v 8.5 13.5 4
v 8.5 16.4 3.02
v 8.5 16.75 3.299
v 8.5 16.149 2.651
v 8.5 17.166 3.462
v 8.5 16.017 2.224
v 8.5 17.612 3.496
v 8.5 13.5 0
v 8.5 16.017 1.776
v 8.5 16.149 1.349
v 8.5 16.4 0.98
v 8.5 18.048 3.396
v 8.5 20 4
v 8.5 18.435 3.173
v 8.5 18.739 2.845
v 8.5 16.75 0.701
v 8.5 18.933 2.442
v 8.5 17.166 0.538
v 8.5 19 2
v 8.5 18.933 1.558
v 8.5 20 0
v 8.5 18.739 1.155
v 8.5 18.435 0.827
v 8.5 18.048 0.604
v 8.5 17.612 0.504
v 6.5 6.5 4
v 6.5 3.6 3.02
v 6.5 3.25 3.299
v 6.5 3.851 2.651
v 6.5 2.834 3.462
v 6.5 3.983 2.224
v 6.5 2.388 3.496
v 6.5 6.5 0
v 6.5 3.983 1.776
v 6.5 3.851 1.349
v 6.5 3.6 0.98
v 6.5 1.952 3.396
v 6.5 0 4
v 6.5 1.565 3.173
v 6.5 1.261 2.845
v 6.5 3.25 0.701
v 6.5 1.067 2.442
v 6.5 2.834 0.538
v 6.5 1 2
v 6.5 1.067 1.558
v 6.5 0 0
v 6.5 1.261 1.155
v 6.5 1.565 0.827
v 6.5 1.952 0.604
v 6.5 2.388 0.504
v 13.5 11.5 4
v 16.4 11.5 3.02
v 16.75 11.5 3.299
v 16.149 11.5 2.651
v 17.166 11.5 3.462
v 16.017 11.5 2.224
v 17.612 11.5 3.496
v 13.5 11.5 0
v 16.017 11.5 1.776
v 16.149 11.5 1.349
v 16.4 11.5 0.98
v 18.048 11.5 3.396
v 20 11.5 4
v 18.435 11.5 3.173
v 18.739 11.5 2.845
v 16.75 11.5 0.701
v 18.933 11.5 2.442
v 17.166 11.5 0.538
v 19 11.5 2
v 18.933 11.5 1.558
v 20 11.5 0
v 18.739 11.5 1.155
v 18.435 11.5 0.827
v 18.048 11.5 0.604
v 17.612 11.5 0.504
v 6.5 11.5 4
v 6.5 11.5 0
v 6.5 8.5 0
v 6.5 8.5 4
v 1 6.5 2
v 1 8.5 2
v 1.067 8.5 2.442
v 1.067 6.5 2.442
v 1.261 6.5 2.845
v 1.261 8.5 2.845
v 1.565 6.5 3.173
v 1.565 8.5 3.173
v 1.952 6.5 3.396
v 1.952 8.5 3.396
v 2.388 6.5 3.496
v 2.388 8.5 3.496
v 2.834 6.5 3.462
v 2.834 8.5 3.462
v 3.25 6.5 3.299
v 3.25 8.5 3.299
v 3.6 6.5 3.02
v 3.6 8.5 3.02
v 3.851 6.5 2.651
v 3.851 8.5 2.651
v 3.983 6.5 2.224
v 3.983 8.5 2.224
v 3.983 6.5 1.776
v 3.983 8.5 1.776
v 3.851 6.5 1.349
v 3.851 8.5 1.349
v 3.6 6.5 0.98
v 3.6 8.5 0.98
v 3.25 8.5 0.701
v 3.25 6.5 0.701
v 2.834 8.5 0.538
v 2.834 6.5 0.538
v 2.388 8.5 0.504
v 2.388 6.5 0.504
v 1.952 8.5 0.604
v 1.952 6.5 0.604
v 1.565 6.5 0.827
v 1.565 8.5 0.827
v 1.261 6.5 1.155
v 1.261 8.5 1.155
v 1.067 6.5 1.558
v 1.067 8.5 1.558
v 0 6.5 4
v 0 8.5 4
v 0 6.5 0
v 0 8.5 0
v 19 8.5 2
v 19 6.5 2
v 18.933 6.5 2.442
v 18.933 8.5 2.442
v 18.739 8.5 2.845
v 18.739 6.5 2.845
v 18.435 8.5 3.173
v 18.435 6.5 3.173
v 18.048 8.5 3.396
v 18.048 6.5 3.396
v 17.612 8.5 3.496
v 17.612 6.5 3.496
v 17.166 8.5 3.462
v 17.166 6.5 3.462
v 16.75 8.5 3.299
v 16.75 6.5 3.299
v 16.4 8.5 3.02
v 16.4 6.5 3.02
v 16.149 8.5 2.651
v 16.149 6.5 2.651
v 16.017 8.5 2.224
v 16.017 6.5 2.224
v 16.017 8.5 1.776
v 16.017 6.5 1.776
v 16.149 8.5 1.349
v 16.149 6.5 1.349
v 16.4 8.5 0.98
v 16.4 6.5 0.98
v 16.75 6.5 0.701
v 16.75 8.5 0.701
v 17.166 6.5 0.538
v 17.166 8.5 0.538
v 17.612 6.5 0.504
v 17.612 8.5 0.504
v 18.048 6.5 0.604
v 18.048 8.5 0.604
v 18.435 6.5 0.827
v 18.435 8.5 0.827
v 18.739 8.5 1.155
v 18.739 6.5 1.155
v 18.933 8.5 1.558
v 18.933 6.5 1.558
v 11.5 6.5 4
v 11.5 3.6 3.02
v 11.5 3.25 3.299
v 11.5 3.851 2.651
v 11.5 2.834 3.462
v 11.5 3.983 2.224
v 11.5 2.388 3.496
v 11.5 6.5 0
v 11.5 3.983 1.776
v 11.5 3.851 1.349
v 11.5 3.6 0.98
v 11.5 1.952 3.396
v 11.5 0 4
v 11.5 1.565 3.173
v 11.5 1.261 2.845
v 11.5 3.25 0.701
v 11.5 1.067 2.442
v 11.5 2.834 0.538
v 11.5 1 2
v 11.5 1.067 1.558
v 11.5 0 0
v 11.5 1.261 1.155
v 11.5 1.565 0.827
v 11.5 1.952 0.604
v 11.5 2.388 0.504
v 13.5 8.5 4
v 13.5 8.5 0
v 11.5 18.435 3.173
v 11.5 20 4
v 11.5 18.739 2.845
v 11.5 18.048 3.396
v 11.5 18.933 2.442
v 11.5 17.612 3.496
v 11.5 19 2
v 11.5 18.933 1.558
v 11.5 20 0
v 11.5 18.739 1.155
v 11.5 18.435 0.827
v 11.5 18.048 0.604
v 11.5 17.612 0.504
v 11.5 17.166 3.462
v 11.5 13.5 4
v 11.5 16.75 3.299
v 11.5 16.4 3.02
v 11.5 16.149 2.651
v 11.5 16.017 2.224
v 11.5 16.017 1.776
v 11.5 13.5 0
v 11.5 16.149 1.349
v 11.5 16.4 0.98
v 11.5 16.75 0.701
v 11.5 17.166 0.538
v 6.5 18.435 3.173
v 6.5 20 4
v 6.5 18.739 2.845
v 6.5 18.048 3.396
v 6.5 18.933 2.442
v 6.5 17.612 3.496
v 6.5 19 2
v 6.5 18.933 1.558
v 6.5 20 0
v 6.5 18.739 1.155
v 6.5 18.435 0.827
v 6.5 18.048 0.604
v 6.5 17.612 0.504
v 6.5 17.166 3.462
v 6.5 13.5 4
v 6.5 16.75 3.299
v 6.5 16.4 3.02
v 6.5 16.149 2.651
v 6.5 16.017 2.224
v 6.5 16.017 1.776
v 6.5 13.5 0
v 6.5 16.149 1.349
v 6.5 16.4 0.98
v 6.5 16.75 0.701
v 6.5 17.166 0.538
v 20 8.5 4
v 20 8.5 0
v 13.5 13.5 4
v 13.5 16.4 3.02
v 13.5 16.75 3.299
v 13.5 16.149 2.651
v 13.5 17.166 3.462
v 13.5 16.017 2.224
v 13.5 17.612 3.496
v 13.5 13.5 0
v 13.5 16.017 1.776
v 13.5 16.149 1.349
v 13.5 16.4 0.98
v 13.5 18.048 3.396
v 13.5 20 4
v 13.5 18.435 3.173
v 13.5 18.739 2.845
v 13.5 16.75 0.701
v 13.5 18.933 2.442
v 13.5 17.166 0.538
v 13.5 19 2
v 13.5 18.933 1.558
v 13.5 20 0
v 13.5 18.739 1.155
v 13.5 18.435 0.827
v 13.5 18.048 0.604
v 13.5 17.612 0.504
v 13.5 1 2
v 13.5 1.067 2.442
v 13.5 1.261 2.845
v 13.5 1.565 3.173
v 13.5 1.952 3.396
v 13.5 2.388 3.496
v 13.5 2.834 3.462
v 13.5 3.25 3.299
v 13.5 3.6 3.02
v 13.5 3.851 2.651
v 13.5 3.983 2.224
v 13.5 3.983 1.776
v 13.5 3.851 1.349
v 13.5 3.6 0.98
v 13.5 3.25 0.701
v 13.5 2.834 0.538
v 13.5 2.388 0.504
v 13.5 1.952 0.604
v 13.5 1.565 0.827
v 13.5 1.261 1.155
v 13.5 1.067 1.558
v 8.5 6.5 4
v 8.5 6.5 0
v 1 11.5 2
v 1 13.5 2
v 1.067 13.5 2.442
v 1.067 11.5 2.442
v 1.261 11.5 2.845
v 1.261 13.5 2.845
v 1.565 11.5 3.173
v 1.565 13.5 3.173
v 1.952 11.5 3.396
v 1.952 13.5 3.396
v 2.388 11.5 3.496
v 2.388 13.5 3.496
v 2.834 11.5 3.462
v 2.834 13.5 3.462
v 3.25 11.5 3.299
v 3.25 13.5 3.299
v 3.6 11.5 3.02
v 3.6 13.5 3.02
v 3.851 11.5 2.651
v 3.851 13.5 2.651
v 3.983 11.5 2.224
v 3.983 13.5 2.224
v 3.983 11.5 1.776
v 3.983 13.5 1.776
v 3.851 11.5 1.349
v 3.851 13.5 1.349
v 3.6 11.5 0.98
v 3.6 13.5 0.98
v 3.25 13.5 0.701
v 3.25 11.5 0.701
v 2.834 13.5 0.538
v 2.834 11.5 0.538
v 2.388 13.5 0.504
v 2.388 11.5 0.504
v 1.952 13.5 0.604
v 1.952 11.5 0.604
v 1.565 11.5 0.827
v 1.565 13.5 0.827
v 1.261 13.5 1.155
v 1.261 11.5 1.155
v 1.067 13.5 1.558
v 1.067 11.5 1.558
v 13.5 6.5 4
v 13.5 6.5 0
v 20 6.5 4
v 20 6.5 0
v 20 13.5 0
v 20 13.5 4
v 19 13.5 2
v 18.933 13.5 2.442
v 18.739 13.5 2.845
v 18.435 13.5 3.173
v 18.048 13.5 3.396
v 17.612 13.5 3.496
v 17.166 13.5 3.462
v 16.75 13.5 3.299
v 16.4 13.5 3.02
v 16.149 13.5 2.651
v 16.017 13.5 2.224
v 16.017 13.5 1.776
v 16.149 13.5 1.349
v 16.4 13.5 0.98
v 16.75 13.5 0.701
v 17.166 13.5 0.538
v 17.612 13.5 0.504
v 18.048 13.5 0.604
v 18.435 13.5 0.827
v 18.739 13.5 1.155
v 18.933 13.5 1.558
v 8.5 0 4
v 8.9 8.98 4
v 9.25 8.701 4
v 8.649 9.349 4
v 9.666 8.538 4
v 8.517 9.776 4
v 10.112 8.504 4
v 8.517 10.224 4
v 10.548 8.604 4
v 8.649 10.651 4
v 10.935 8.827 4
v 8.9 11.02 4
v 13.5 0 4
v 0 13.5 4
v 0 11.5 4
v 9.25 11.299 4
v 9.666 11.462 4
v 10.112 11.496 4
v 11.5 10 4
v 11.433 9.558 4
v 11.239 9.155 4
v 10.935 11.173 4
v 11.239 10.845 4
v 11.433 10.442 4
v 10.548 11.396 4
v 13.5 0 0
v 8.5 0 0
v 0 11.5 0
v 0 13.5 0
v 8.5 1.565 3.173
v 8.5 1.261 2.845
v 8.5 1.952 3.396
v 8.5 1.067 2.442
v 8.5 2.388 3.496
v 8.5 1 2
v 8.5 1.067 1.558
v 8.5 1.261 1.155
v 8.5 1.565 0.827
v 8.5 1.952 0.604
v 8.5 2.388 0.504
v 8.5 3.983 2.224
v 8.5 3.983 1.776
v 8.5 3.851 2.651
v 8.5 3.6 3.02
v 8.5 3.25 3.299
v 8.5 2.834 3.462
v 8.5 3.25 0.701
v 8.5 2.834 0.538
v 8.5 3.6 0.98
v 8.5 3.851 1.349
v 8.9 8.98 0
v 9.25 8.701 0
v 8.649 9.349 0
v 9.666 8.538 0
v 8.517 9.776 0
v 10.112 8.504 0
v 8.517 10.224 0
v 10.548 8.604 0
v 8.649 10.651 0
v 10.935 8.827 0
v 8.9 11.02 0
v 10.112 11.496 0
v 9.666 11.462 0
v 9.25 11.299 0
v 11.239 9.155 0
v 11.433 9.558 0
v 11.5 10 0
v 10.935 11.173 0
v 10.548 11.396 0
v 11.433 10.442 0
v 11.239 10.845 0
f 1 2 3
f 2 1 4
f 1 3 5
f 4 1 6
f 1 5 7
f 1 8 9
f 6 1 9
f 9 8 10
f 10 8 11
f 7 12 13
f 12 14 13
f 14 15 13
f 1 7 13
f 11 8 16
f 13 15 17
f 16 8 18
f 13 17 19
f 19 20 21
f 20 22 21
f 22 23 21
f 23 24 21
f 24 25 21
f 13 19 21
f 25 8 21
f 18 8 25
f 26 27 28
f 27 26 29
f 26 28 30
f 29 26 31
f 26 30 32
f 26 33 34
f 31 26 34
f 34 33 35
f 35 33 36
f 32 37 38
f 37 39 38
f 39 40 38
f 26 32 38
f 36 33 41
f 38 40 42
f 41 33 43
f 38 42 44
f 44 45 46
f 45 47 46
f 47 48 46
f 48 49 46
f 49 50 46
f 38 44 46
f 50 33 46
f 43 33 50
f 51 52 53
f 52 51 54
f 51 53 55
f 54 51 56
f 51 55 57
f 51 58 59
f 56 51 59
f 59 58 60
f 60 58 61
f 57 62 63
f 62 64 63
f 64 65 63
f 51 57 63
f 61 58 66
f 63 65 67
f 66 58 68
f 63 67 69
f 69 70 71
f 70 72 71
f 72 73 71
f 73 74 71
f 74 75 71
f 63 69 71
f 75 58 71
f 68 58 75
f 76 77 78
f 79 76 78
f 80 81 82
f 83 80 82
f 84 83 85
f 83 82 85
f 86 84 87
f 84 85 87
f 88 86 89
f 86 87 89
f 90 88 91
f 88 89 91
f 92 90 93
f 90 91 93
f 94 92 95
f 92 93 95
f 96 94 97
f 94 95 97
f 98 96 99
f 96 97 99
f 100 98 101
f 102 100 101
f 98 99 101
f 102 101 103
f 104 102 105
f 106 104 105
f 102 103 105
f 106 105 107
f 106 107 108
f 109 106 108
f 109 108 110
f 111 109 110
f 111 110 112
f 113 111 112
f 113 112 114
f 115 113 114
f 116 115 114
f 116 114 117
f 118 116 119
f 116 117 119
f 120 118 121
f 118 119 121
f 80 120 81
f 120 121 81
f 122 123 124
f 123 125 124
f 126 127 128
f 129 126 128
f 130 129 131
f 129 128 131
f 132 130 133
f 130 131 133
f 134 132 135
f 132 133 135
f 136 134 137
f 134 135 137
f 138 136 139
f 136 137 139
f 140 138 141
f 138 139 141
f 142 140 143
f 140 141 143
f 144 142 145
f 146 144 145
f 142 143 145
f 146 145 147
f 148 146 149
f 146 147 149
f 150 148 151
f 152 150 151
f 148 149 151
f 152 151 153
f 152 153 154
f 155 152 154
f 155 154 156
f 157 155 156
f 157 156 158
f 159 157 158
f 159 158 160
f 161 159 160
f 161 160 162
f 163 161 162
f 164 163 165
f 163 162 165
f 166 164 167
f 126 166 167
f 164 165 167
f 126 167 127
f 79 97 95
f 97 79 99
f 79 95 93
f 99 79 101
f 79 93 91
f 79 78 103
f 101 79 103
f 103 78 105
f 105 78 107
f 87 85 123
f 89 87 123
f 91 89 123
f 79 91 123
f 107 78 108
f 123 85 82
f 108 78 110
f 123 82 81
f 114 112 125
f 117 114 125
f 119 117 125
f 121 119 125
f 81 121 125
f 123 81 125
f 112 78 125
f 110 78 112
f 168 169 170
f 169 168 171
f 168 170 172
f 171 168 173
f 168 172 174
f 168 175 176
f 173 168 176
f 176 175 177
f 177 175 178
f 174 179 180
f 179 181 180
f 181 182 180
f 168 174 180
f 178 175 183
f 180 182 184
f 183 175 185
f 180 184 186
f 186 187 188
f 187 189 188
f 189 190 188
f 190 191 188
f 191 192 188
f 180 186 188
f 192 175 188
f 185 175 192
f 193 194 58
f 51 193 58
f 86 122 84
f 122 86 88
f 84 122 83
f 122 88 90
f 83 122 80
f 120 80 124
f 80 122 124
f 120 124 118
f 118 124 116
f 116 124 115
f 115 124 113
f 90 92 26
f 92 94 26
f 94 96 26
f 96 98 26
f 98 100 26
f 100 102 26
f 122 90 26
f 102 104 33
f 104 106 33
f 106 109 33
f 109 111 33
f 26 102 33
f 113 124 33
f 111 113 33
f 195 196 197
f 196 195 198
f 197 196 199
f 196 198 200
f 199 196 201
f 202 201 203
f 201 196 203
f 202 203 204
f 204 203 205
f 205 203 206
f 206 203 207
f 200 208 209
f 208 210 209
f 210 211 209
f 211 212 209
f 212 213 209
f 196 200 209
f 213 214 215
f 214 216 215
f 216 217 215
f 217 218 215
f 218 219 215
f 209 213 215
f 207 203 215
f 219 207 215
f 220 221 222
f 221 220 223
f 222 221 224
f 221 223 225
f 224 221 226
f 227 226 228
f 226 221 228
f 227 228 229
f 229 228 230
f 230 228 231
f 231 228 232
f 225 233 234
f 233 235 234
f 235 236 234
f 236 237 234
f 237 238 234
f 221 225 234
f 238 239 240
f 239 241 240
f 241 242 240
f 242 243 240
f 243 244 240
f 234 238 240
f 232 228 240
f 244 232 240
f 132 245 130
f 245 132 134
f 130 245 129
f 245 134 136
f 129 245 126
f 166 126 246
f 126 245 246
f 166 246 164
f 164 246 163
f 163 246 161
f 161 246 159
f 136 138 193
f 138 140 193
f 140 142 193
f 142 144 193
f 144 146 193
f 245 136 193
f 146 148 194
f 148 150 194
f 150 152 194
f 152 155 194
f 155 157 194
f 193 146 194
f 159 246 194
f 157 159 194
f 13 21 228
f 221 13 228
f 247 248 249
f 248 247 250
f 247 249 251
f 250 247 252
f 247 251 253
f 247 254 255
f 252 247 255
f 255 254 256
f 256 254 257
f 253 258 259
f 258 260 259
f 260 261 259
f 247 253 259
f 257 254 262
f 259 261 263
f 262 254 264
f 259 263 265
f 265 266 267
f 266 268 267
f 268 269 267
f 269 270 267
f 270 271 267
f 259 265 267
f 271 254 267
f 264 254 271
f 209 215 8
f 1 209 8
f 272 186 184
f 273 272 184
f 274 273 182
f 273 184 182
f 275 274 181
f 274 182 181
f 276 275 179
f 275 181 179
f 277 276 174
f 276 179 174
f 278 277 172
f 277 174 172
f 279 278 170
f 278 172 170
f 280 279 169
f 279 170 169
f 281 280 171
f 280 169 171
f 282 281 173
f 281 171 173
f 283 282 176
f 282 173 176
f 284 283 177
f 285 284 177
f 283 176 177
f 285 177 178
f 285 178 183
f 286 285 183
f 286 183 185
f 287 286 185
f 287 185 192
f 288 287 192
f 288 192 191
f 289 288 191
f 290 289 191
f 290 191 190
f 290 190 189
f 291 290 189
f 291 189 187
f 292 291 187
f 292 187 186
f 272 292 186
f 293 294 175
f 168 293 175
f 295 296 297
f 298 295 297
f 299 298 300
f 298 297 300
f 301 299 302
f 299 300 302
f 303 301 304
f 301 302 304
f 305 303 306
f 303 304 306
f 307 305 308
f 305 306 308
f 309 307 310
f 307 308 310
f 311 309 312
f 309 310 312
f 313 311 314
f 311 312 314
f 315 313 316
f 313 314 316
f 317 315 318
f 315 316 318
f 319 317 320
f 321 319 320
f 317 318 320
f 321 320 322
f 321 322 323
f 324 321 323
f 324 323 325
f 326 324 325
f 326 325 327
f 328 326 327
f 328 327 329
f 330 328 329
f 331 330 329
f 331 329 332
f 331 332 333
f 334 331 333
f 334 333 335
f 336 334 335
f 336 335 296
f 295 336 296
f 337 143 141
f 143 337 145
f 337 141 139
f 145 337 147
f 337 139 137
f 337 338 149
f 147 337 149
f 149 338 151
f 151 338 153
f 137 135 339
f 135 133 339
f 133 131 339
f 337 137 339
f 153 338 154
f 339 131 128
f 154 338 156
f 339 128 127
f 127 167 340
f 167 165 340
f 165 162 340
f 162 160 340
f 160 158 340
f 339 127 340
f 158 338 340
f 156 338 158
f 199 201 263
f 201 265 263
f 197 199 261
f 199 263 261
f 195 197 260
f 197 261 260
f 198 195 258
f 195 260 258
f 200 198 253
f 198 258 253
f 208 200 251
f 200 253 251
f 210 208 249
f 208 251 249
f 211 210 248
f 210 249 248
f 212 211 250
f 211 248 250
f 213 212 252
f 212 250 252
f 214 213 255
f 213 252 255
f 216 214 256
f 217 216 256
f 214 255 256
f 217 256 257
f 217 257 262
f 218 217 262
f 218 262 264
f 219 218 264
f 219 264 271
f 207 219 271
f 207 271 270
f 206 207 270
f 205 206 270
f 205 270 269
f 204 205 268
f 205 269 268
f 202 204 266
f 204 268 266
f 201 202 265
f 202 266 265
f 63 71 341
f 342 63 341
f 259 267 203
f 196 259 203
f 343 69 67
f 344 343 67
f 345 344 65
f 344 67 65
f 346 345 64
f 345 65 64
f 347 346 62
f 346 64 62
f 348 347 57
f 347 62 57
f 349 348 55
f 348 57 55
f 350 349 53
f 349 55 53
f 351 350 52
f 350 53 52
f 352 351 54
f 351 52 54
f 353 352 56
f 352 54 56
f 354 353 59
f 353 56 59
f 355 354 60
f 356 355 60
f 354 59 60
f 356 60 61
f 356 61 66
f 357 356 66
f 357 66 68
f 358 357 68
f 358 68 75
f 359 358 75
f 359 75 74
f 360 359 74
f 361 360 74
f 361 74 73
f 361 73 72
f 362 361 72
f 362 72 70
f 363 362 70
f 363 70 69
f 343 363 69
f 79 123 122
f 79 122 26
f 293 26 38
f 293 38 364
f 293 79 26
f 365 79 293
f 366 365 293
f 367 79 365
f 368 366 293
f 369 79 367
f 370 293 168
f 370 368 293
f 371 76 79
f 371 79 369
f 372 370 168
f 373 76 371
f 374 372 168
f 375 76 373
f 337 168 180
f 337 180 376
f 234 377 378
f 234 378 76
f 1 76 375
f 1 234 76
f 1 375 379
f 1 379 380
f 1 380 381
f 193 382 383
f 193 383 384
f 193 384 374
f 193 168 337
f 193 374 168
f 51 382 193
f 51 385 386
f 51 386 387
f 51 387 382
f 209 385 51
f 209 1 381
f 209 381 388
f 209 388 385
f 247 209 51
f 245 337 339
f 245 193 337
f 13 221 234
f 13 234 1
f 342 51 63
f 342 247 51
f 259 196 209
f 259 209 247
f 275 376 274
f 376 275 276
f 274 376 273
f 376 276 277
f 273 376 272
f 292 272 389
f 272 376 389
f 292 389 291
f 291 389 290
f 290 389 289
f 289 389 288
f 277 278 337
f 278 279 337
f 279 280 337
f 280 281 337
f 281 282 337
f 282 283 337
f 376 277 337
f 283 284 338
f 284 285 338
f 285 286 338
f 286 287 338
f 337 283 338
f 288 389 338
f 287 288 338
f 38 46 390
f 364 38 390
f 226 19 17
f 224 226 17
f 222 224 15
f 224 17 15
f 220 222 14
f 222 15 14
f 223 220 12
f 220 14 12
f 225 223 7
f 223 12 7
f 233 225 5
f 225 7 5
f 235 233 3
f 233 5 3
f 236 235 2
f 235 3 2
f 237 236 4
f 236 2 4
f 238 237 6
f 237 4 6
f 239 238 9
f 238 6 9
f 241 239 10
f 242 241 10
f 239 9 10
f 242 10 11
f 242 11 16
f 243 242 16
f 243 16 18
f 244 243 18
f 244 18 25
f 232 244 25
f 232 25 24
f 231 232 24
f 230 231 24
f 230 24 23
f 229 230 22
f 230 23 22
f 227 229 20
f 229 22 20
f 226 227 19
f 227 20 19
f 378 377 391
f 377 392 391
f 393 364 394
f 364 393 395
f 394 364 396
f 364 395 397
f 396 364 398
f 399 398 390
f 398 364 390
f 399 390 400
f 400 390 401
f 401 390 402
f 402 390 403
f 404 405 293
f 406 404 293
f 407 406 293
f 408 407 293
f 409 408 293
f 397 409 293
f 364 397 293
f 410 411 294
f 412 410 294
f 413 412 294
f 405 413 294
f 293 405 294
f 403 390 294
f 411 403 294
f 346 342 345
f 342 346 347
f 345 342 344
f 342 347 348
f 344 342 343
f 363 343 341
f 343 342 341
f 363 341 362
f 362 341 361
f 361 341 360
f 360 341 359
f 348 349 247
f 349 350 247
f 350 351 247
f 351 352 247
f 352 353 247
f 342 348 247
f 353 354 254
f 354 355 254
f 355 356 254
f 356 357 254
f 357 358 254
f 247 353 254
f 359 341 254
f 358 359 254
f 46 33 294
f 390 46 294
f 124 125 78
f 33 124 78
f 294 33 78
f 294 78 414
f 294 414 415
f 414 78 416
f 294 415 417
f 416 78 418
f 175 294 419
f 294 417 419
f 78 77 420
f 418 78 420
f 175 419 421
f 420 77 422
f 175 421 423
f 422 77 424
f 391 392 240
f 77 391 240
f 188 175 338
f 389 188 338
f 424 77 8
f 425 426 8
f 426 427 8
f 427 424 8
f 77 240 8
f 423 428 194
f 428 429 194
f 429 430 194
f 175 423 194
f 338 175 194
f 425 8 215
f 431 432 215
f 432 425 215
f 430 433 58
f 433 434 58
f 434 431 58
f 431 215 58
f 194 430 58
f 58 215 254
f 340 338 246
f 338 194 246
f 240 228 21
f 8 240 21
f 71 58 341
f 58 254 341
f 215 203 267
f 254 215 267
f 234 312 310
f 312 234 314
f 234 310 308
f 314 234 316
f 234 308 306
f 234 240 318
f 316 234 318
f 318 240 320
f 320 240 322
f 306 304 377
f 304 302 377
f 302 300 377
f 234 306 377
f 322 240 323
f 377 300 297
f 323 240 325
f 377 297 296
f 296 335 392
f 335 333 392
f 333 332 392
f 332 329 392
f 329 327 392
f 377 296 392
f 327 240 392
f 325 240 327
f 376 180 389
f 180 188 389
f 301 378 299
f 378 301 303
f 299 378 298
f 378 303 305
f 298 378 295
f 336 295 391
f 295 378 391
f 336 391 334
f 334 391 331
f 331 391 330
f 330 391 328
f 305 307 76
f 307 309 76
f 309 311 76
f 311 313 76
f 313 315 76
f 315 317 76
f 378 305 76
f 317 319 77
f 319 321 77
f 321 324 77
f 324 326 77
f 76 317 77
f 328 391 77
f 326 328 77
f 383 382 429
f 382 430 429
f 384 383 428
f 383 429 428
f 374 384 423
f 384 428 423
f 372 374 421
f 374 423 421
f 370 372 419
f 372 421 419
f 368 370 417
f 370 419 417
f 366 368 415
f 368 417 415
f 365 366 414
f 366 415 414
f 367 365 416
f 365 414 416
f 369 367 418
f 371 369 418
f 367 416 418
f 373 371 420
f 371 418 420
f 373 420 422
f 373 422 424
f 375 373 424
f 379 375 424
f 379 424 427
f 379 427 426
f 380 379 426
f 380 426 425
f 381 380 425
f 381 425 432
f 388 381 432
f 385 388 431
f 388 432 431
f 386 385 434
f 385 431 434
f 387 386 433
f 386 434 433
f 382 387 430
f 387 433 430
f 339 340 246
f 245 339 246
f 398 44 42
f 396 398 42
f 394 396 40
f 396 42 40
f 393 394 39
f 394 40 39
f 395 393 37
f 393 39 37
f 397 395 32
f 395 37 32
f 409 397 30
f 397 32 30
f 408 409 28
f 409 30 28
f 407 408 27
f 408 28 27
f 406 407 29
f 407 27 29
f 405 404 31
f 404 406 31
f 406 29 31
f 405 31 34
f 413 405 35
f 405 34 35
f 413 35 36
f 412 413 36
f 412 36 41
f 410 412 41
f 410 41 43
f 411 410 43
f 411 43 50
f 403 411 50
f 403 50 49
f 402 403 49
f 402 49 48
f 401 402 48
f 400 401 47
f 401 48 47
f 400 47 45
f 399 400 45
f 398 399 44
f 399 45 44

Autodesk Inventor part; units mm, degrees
ref_plane "YZ Plane" through (0, 0, 0) normal (1, 0, 0) x (0, 1, 0)
ref_plane "XZ Plane" through (0, 0, 0) normal (0, 1, 0) x (-1, 0, 0)
ref_plane "XY Plane" through (0, 0, 0) normal (0, 0, 1) x (1, 0, 0)
sketch "Sketch1" plane through (0, 0, 0) normal (0, 0, 1) x (1, 0, 0)
  line L0 (0, 0) -> (20, 0)
  line L1 (20, 0) -> (20, 20)
  line L2 (20, 20) -> (0, 20)
  line L3 (0, 20) -> (0, 0)
  line L4 (8.4977, 20) -> (6.4977, 20)
  line L5 (6.4977, 0) -> (8.4977, 0)
  line L6 (0, 3.9) -> (0, 5.9)
  line L7 (20, 8.9) -> (20, 10.9)
  line L8 (0, 10.9) -> (0, 8.9)
  line L9 (10, 0) -> (10, 10)
  circle A0 centre (10, 10) radius 1.5
  line L10 (0, 11.5) -> (20, 11.5)
  line L11 (20, 11.5) -> (20, 13.5)
  line L12 (20, 13.5) -> (0, 13.5)
  line L13 (0, 13.5) -> (0, 11.5)
  line L14 (6.5, 20) -> (6.5, 0)
  line L15 (8.5, 0) -> (8.5, 20)
  line L16 (0, 6.5) -> (20, 6.5)
  line L17 (20, 8.5) -> (0, 8.5)
  line L18 (13.5, 0) -> (13.5, 20)
  line L19 (11.5, 20) -> (11.5, 0)
  point P0 (6.5, 11.5)
  point P1 (6.5, 8.5)
  point P2 (6.5, 6.5)
  point P3 (6.5, 0)
  point P4 (8.5, 6.5)
  point P5 (10, 6.5)
  point P6 (13.5, 6.5)
  point P7 (13.5, 8.5)
  point P8 (13.5, 11.5)
  point P9 (13.5, 13.5)
  point P10 (11.5, 13.5)
  point P11 (8.5, 13.5)
  point P12 (6.5, 13.5)
  point P13 (0, 13.5)
  point P14 (11.5, 6.5)
  dimension "d0" = 20
  dimension "d1" = 20
  dimension "d7" = 2
  dimension "d10" = 2
  dimension "d19" = 10
  dimension "d20" = 3
  dimension "d21" = 20
  dimension "d22" = 2
  dimension "d25" = 360
extrude "Extrusion1" add sketch "Sketch1" along normal blind 4 contours L14 L16 L15 L0 | L16 L3 L17 L14 | L14 L17 L15 L16 | L14 L10 L15 L17 | L15 L17 L9 L16 | L14 L12 L15 L10 | L10 L3 L12 L14 | L15 A0 L17 | L9 L17 L19 L16 | L19 L16 L18 L0 | L15 L12 L19 L10 | L10 A0 L15 | L14 L2 L15 L12 | A0 L19 L17 | L19 L17 L18 L16 | L10 L19 A0 | L19 L10 L18 L17 | L18 L17 L1 L16 | L19 L12 L18 L10 | L19 L2 L18 L12 | L18 L12 L1 L10
sketch "Sketch3" plane through (13.5, 6.5, 0) normal (0, -1, 0) x (1, 0, 0)
  line L0 (0, 0) -> (0, 4) projected
  line L1 (0, 0) -> (4, 0)
  line L2 (0, 0) -> (6.5, 0) projected
  line L3 (4, 0) -> (4, 2)
  circle A0 centre (4, 2) radius 1.5
  point P0 (-13.5, 0)
  dimension "d27" = 4
  dimension "d28" = 2
  dimension "d29" = 3
extrude "Extrusion3" cut sketch "Sketch3" against normal blind 10
pattern_circular "Circular Pattern2" count 4 over 360 about axis through (10, 10, 0) along (0, 0, 1) of "Extrusion3"
properties part number "Center Connector"
